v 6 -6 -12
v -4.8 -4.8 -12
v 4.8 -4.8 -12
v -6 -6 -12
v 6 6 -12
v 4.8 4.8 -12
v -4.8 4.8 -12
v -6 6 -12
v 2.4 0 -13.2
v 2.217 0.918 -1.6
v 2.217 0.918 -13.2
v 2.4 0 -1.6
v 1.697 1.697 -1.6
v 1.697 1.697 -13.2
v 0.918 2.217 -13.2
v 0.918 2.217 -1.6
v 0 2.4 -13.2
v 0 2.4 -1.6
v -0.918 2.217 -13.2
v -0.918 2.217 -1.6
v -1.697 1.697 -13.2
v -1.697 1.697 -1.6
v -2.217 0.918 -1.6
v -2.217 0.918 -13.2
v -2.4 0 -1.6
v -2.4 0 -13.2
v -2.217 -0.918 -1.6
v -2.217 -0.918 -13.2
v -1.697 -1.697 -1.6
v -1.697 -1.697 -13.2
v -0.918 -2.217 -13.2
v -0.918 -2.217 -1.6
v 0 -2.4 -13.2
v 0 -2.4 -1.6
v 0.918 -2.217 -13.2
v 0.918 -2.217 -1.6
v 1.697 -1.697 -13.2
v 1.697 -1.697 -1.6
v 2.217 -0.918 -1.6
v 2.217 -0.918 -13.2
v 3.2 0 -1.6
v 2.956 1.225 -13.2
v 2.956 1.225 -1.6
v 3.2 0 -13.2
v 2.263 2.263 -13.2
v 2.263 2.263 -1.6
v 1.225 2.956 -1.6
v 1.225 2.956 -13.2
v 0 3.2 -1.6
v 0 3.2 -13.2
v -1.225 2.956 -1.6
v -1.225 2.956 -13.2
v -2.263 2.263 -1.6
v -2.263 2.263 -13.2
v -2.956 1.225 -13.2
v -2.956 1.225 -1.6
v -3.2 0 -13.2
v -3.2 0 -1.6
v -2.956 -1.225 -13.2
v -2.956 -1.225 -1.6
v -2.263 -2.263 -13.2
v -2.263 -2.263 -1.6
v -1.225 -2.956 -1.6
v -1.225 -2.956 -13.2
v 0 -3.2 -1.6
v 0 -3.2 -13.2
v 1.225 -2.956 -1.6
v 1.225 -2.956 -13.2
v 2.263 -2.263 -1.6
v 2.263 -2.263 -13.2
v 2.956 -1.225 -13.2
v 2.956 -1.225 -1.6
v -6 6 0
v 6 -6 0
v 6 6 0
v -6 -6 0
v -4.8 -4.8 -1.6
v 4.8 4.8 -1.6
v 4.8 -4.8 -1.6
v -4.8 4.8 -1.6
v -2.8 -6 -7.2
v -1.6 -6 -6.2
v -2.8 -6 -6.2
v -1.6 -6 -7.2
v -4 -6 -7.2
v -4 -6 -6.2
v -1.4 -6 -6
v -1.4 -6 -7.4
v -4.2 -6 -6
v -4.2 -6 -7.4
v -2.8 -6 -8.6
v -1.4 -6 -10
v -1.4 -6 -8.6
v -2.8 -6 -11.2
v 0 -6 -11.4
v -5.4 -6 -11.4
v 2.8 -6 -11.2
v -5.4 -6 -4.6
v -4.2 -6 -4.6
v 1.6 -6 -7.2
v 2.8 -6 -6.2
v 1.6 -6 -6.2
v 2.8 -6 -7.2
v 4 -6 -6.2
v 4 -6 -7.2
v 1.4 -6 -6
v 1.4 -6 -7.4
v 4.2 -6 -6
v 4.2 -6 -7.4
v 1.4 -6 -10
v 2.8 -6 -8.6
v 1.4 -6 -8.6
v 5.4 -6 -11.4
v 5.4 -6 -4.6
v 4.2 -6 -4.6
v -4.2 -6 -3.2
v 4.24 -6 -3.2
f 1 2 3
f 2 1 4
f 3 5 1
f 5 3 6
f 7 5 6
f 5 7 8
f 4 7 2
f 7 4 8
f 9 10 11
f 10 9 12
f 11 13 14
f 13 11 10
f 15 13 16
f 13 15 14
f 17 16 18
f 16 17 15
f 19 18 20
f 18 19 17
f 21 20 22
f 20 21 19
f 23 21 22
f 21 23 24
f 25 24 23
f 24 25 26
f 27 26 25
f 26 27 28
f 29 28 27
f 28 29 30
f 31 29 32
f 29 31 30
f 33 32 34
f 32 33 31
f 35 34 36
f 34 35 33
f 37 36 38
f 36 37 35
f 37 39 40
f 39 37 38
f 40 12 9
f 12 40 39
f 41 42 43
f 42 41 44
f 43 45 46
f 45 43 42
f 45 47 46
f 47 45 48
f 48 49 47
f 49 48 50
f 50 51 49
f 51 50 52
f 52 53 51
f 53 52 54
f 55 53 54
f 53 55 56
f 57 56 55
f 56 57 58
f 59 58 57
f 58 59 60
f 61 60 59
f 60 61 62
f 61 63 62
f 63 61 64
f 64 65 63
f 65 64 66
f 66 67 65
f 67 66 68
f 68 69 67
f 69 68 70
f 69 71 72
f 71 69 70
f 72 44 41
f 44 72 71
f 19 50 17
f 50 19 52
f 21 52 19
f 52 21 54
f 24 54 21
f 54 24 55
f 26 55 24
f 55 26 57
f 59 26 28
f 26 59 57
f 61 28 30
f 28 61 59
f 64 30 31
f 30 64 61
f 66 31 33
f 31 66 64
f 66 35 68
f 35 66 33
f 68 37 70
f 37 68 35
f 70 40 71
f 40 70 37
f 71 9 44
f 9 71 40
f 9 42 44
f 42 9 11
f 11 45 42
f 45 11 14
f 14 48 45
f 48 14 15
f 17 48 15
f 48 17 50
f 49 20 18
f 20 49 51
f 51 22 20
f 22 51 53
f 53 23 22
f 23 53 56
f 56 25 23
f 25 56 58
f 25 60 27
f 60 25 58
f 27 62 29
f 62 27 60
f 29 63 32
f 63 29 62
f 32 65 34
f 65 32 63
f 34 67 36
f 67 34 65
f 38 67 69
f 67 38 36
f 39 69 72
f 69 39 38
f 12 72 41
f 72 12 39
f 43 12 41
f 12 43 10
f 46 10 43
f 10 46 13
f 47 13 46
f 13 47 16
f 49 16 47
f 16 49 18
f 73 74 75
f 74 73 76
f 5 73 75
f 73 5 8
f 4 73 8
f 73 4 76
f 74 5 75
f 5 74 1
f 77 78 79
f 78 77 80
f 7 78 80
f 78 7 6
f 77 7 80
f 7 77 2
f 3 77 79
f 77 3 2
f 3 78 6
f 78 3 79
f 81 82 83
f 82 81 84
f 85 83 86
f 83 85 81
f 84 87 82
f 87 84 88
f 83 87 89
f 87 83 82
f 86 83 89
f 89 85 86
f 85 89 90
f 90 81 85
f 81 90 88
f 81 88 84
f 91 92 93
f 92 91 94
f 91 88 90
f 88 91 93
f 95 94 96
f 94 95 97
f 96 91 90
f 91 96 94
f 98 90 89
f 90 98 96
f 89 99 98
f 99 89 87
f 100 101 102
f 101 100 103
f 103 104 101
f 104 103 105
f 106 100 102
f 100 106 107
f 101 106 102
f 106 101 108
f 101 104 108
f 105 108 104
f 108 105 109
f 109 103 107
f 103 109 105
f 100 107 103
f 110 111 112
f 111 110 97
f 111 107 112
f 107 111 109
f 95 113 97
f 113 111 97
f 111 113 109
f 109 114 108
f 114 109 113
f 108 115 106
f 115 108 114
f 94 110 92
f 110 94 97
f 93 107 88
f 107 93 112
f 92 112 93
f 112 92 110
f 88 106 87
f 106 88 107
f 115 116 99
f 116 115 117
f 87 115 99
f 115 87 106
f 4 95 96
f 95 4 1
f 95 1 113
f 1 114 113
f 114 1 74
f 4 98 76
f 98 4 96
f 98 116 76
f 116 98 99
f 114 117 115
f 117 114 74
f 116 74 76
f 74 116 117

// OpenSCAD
// file: ../p/4-4ring3.scad
use <../lib.scad>
$fa=1; $fs=0.2;
function ldraw_lib__4_4ring3(realsolid=false) = [
// 0 Ring  3 x 1.0
// 0 Name: 4-4ring3.dat
// 0 Author: James Jessiman
// 0 !LDRAW_ORG Primitive UPDATE 2009-01
// 0 !LICENSE Licensed under CC BY 2.0 and CC BY 4.0 : see CAreadme.txt
// 
// 0 BFC CERTIFY CCW
  [0,"BFC","CERTIFY"],
  [0,"BFC","CCW"],
// 
// 0 !HISTORY 1998-12-15 [PTadmin] Official Update 1998-10
// 0 !HISTORY 2002-04-05 [hafhead] Added BFC statement
// 0 !HISTORY 2002-04-25 [PTadmin] Official Update 2002-02
// 0 !HISTORY 2007-06-24 [PTadmin] Header formatted for Contributor Agreement
// 0 !HISTORY 2008-07-01 [PTadmin] Official Update 2008-01
// 0 !HISTORY 2008-08-26 [cwdee] Switch polygon winding and rename
// 0 !HISTORY 2009-05-02 [PTadmin] Official Update 2009-01
// 
// 
// 4 16 -1.5308 0 3.6956 -1.1481 0 2.7717 0 0 3 0 0 4
  [4,16,-1.5308,0,3.6956,-1.1481,0,2.7717,0,0,3,0,0,4],
// 4 16 -2.8284 0 2.8284 -2.1213 0 2.1213 -1.1481 0 2.7717 -1.5308 0 3.6956
  [4,16,-2.8284,0,2.8284,-2.1213,0,2.1213,-1.1481,0,2.7717,-1.5308,0,3.6956],
// 4 16 -3.6956 0 1.5308 -2.7717 0 1.1481 -2.1213 0 2.1213 -2.8284 0 2.8284
  [4,16,-3.6956,0,1.5308,-2.7717,0,1.1481,-2.1213,0,2.1213,-2.8284,0,2.8284],
// 4 16 -4 0 0 -3 0 0 -2.7717 0 1.1481 -3.6956 0 1.5308
  [4,16,-4,0,0,-3,0,0,-2.7717,0,1.1481,-3.6956,0,1.5308],
// 4 16 -3.6956 0 -1.5308 -2.7717 0 -1.1481 -3 0 0 -4 0 0
  [4,16,-3.6956,0,-1.5308,-2.7717,0,-1.1481,-3,0,0,-4,0,0],
// 4 16 -2.8284 0 -2.8284 -2.1213 0 -2.1213 -2.7717 0 -1.1481 -3.6956 0 -1.5308
  [4,16,-2.8284,0,-2.8284,-2.1213,0,-2.1213,-2.7717,0,-1.1481,-3.6956,0,-1.5308],
// 4 16 -1.5308 0 -3.6956 -1.1481 0 -2.7717 -2.1213 0 -2.1213 -2.8284 0 -2.8284
  [4,16,-1.5308,0,-3.6956,-1.1481,0,-2.7717,-2.1213,0,-2.1213,-2.8284,0,-2.8284],
// 4 16 0 0 -4 0 0 -3 -1.1481 0 -2.7717 -1.5308 0 -3.6956
  [4,16,0,0,-4,0,0,-3,-1.1481,0,-2.7717,-1.5308,0,-3.6956],
// 4 16 1.5308 0 -3.6956 1.1481 0 -2.7717 0 0 -3 0 0 -4
  [4,16,1.5308,0,-3.6956,1.1481,0,-2.7717,0,0,-3,0,0,-4],
// 4 16 2.8284 0 -2.8284 2.1213 0 -2.1213 1.1481 0 -2.7717 1.5308 0 -3.6956
  [4,16,2.8284,0,-2.8284,2.1213,0,-2.1213,1.1481,0,-2.7717,1.5308,0,-3.6956],
// 4 16 3.6956 0 -1.5308 2.7717 0 -1.1481 2.1213 0 -2.1213 2.8284 0 -2.8284
  [4,16,3.6956,0,-1.5308,2.7717,0,-1.1481,2.1213,0,-2.1213,2.8284,0,-2.8284],
// 4 16 4 0 0 3 0 0 2.7717 0 -1.1481 3.6956 0 -1.5308
  [4,16,4,0,0,3,0,0,2.7717,0,-1.1481,3.6956,0,-1.5308],
// 4 16 3.6956 0 1.5308 2.7717 0 1.1481 3 0 0 4 0 0
  [4,16,3.6956,0,1.5308,2.7717,0,1.1481,3,0,0,4,0,0],
// 4 16 2.8284 0 2.8284 2.1213 0 2.1213 2.7717 0 1.1481 3.6956 0 1.5308
  [4,16,2.8284,0,2.8284,2.1213,0,2.1213,2.7717,0,1.1481,3.6956,0,1.5308],
// 4 16 1.5308 0 3.6956 1.1481 0 2.7717 2.1213 0 2.1213 2.8284 0 2.8284
  [4,16,1.5308,0,3.6956,1.1481,0,2.7717,2.1213,0,2.1213,2.8284,0,2.8284],
// 4 16 0 0 4 0 0 3 1.1481 0 2.7717 1.5308 0 3.6956
  [4,16,0,0,4,0,0,3,1.1481,0,2.7717,1.5308,0,3.6956],
// 0
];
module ldraw_lib__4_4ring3(step=0, col=false, unit=2/5, alt=false, line=0.2, solid=!$preview)
    makepoly(ldraw_lib__4_4ring3(solid), step=step, col=col, unit=unit, alt=alt, line=line, solid=solid);
ldraw_lib__4_4ring3(line=0.2);
// file: ../p/4-4edge.scad
use <../lib.scad>
function ldraw_lib__4_4edge() = [
// 0 Circle 1.0
// 0 Name: 4-4edge.dat
// 0 Author: James Jessiman
// 0 !LDRAW_ORG Primitive UPDATE 2017-01
// 0 !LICENSE Licensed under CC BY 2.0 and CC BY 4.0 : see CAreadme.txt
// 
// 0 BFC CERTIFY CCW
  [0,"BFC","CERTIFY"],
  [0,"BFC","CCW"],
// 
// 0 !HISTORY 1998-12-15 [PTadmin] Official Update 1998-10
// 0 !HISTORY 2005-12-28 [PTadmin] Official Update 2005-01
// 0 !HISTORY 2007-06-24 [PTadmin] Header formatted for Contributor Agreement
// 0 !HISTORY 2008-07-01 [PTadmin] Official Update 2008-01
// 0 !HISTORY 2017-01-15 [Steffen] BFCed
// 0 !HISTORY 2017-12-30 [PTadmin] Official Update 2017-01
// 
// 
// 2 24 1 0 0 0.9239 0 0.3827
  [2,24,1,0,0,0.9239,0,0.3827],
// 2 24 0.9239 0 0.3827 0.7071 0 0.7071
  [2,24,0.9239,0,0.3827,0.7071,0,0.7071],
// 2 24 0.7071 0 0.7071 0.3827 0 0.9239
  [2,24,0.7071,0,0.7071,0.3827,0,0.9239],
// 2 24 0.3827 0 0.9239 0 0 1
  [2,24,0.3827,0,0.9239,0,0,1],
// 2 24 0 0 1 -0.3827 0 0.9239
  [2,24,0,0,1,-0.3827,0,0.9239],
// 2 24 -0.3827 0 0.9239 -0.7071 0 0.7071
  [2,24,-0.3827,0,0.9239,-0.7071,0,0.7071],
// 2 24 -0.7071 0 0.7071 -0.9239 0 0.3827
  [2,24,-0.7071,0,0.7071,-0.9239,0,0.3827],
// 2 24 -0.9239 0 0.3827 -1 0 -0
  [2,24,-0.9239,0,0.3827,-1,0,-0],
// 2 24 -1 0 -0 -0.9239 0 -0.3827
  [2,24,-1,0,-0,-0.9239,0,-0.3827],
// 2 24 -0.9239 0 -0.3827 -0.7071 0 -0.7071
  [2,24,-0.9239,0,-0.3827,-0.7071,0,-0.7071],
// 2 24 -0.7071 0 -0.7071 -0.3827 0 -0.9239
  [2,24,-0.7071,0,-0.7071,-0.3827,0,-0.9239],
// 2 24 -0.3827 0 -0.9239 0 0 -1
  [2,24,-0.3827,0,-0.9239,0,0,-1],
// 2 24 0 0 -1 0.3827 0 -0.9239
  [2,24,0,0,-1,0.3827,0,-0.9239],
// 2 24 0.3827 0 -0.9239 0.7071 0 -0.7071
  [2,24,0.3827,0,-0.9239,0.7071,0,-0.7071],
// 2 24 0.7071 0 -0.7071 0.9239 0 -0.3827
  [2,24,0.7071,0,-0.7071,0.9239,0,-0.3827],
// 2 24 0.9239 0 -0.3827 1 0 0
  [2,24,0.9239,0,-0.3827,1,0,0],
];
module ldraw_lib__4_4edge(step=0, col=false, unit=2/5, alt=false, line=0.2, solid=!$preview)
    makepoly(ldraw_lib__4_4edge(), step=step, col=col, unit=unit, alt=alt, line=line, solid=solid);
ldraw_lib__4_4edge(line=0.2);
// file: ../p/4-4cyli.scad
use <../lib.scad>
$fa=1; $fs=0.2;
function ldraw_lib__4_4cyli(realsolid=false) = [
// 0 Cylinder 1.0
// 0 Name: 4-4cyli.dat
// 0 Author: James Jessiman
// 0 !LDRAW_ORG Primitive UPDATE 2005-01
// 0 !LICENSE Licensed under CC BY 2.0 and CC BY 4.0 : see CAreadme.txt
// 
// 0 BFC CERTIFY CCW
  [0,"BFC","CERTIFY"],
  [0,"BFC","CCW"],
// 
// 0 !HISTORY 1998-12-15 [PTadmin] Official Update 1998-10
// 0 !HISTORY 2002-03-23 [sbliss] Added BFC statement; merged headers from files in distributions LDraw 0.27 and Complete.
// 0 !HISTORY 2002-04-25 [PTadmin] Official Update 2002-02
// 0 !HISTORY 2004-12-14 [guyvivan] BFC CCW
// 0 !HISTORY 2005-12-28 [PTadmin] Official Update 2005-01
// 0 !HISTORY 2007-06-24 [PTadmin] Header formatted for Contributor Agreement
// 0 !HISTORY 2008-07-01 [PTadmin] Official Update 2008-01
// 
// 
// 4 16 1 1 0 0.9239 1 0.3827 0.9239 0 0.3827 1 0 0
  [4,16,1,1,0,0.9239,1,0.3827,0.9239,0,0.3827,1,0,0],
// 5 24 1 0 0 1 1 0 0.9239 0 0.3827 0.9239 0 -0.3827
  [5,24,1,0,0,1,1,0,0.9239,0,0.3827,0.9239,0,-0.3827],
// 4 16 0.9239 1 0.3827 0.7071 1 0.7071 0.7071 0 0.7071 0.9239 0 0.3827
  [4,16,0.9239,1,0.3827,0.7071,1,0.7071,0.7071,0,0.7071,0.9239,0,0.3827],
// 5 24 0.9239 0 0.3827 0.9239 1 0.3827 0.7071 0 0.7071 1 0 0
  [5,24,0.9239,0,0.3827,0.9239,1,0.3827,0.7071,0,0.7071,1,0,0],
// 4 16 0.7071 1 0.7071 0.3827 1 0.9239 0.3827 0 0.9239 0.7071 0 0.7071
  [4,16,0.7071,1,0.7071,0.3827,1,0.9239,0.3827,0,0.9239,0.7071,0,0.7071],
// 5 24 0.7071 0 0.7071 0.7071 1 0.7071 0.3827 0 0.9239 0.9239 0 0.3827
  [5,24,0.7071,0,0.7071,0.7071,1,0.7071,0.3827,0,0.9239,0.9239,0,0.3827],
// 4 16 0.3827 1 0.9239 0 1 1 0 0 1 0.3827 0 0.9239
  [4,16,0.3827,1,0.9239,0,1,1,0,0,1,0.3827,0,0.9239],
// 5 24 0.3827 0 0.9239 0.3827 1 0.9239 0 0 1 0.7071 0 0.7071
  [5,24,0.3827,0,0.9239,0.3827,1,0.9239,0,0,1,0.7071,0,0.7071],
// 4 16 0 1 1 -0.3827 1 0.9239 -0.3827 0 0.9239 0 0 1
  [4,16,0,1,1,-0.3827,1,0.9239,-0.3827,0,0.9239,0,0,1],
// 5 24 0 0 1 0 1 1 -0.3827 0 0.9239 0.3827 0 0.9239
  [5,24,0,0,1,0,1,1,-0.3827,0,0.9239,0.3827,0,0.9239],
// 4 16 -0.3827 1 0.9239 -0.7071 1 0.7071 -0.7071 0 0.7071 -0.3827 0 0.9239
  [4,16,-0.3827,1,0.9239,-0.7071,1,0.7071,-0.7071,0,0.7071,-0.3827,0,0.9239],
// 5 24 -0.3827 0 0.9239 -0.3827 1 0.9239 -0.7071 0 0.7071 0 0 1
  [5,24,-0.3827,0,0.9239,-0.3827,1,0.9239,-0.7071,0,0.7071,0,0,1],
// 4 16 -0.7071 1 0.7071 -0.9239 1 0.3827 -0.9239 0 0.3827 -0.7071 0 0.7071
  [4,16,-0.7071,1,0.7071,-0.9239,1,0.3827,-0.9239,0,0.3827,-0.7071,0,0.7071],
// 5 24 -0.7071 0 0.7071 -0.7071 1 0.7071 -0.9239 0 0.3827 -0.3827 0 0.9239
  [5,24,-0.7071,0,0.7071,-0.7071,1,0.7071,-0.9239,0,0.3827,-0.3827,0,0.9239],
// 4 16 -0.9239 1 0.3827 -1 1 0 -1 0 0 -0.9239 0 0.3827
  [4,16,-0.9239,1,0.3827,-1,1,0,-1,0,0,-0.9239,0,0.3827],
// 5 24 -0.9239 0 0.3827 -0.9239 1 0.3827 -1 0 0 -0.7071 0 0.7071
  [5,24,-0.9239,0,0.3827,-0.9239,1,0.3827,-1,0,0,-0.7071,0,0.7071],
// 4 16 -1 1 0 -0.9239 1 -0.3827 -0.9239 0 -0.3827 -1 0 0
  [4,16,-1,1,0,-0.9239,1,-0.3827,-0.9239,0,-0.3827,-1,0,0],
// 5 24 -1 0 0 -1 1 0 -0.9239 0 -0.3827 -0.9239 0 0.3827
  [5,24,-1,0,0,-1,1,0,-0.9239,0,-0.3827,-0.9239,0,0.3827],
// 4 16 -0.9239 1 -0.3827 -0.7071 1 -0.7071 -0.7071 0 -0.7071 -0.9239 0 -0.3827
  [4,16,-0.9239,1,-0.3827,-0.7071,1,-0.7071,-0.7071,0,-0.7071,-0.9239,0,-0.3827],
// 5 24 -0.9239 0 -0.3827 -0.9239 1 -0.3827 -0.7071 0 -0.7071 -1 0 0
  [5,24,-0.9239,0,-0.3827,-0.9239,1,-0.3827,-0.7071,0,-0.7071,-1,0,0],
// 4 16 -0.7071 1 -0.7071 -0.3827 1 -0.9239 -0.3827 0 -0.9239 -0.7071 0 -0.7071
  [4,16,-0.7071,1,-0.7071,-0.3827,1,-0.9239,-0.3827,0,-0.9239,-0.7071,0,-0.7071],
// 5 24 -0.7071 0 -0.7071 -0.7071 1 -0.7071 -0.3827 0 -0.9239 -0.9239 0 -0.3827
  [5,24,-0.7071,0,-0.7071,-0.7071,1,-0.7071,-0.3827,0,-0.9239,-0.9239,0,-0.3827],
// 4 16 -0.3827 1 -0.9239 0 1 -1 0 0 -1 -0.3827 0 -0.9239
  [4,16,-0.3827,1,-0.9239,0,1,-1,0,0,-1,-0.3827,0,-0.9239],
// 5 24 -0.3827 0 -0.9239 -0.3827 1 -0.9239 0 0 -1 -0.7071 0 -0.7071
  [5,24,-0.3827,0,-0.9239,-0.3827,1,-0.9239,0,0,-1,-0.7071,0,-0.7071],
// 4 16 0 1 -1 0.3827 1 -0.9239 0.3827 0 -0.9239 0 0 -1
  [4,16,0,1,-1,0.3827,1,-0.9239,0.3827,0,-0.9239,0,0,-1],
// 5 24 0 0 -1 0 1 -1 0.3827 0 -0.9239 -0.3827 0 -0.9239
  [5,24,0,0,-1,0,1,-1,0.3827,0,-0.9239,-0.3827,0,-0.9239],
// 4 16 0.3827 1 -0.9239 0.7071 1 -0.7071 0.7071 0 -0.7071 0.3827 0 -0.9239
  [4,16,0.3827,1,-0.9239,0.7071,1,-0.7071,0.7071,0,-0.7071,0.3827,0,-0.9239],
// 5 24 0.3827 0 -0.9239 0.3827 1 -0.9239 0.7071 0 -0.7071 0 0 -1
  [5,24,0.3827,0,-0.9239,0.3827,1,-0.9239,0.7071,0,-0.7071,0,0,-1],
// 4 16 0.7071 1 -0.7071 0.9239 1 -0.3827 0.9239 0 -0.3827 0.7071 0 -0.7071
  [4,16,0.7071,1,-0.7071,0.9239,1,-0.3827,0.9239,0,-0.3827,0.7071,0,-0.7071],
// 5 24 0.7071 0 -0.7071 0.7071 1 -0.7071 0.9239 0 -0.3827 0.3827 0 -0.9239
  [5,24,0.7071,0,-0.7071,0.7071,1,-0.7071,0.9239,0,-0.3827,0.3827,0,-0.9239],
// 4 16 0.9239 1 -0.3827 1 1 0 1 0 0 0.9239 0 -0.3827
  [4,16,0.9239,1,-0.3827,1,1,0,1,0,0,0.9239,0,-0.3827],
// 5 24 0.9239 0 -0.3827 0.9239 1 -0.3827 1 0 0 0.7071 0 -0.7071
  [5,24,0.9239,0,-0.3827,0.9239,1,-0.3827,1,0,0,0.7071,0,-0.7071],
// 0
];
module ldraw_lib__4_4cyli(step=0, col=false, unit=2/5, alt=false, line=0.2, solid=!$preview)
    makepoly(ldraw_lib__4_4cyli(solid), step=step, col=col, unit=unit, alt=alt, line=line, solid=solid);
ldraw_lib__4_4cyli(line=0.2);
// file: ../p/stud4.scad
use <../lib.scad>
use <4-4cyli.scad>
use <4-4edge.scad>
use <4-4ring3.scad>
function ldraw_lib__stud4() = [
// 0 Stud Tube Open
// 0 Name: stud4.dat
// 0 Author: James Jessiman
// 0 !LDRAW_ORG Primitive UPDATE 2009-02
// 0 !LICENSE Licensed under CC BY 4.0 : see CAreadme.txt
// 
// 0 BFC CERTIFY CCW
  [0,"BFC","CERTIFY"],
  [0,"BFC","CCW"],
// 
// 0 !HISTORY 1999-07-05 [PTadmin] Official Update 1999-05
// 0 !HISTORY 2002-04-04 [sbliss] Modified for BFC compliance
// 0 !HISTORY 2002-04-25 [PTadmin] Official Update 2002-02
// 0 !HISTORY 2007-06-24 [PTadmin] Header formatted for Contributor Agreement
// 0 !HISTORY 2008-07-01 [PTadmin] Official Update 2008-01
// 0 !HISTORY 2009-06-21 [cwdee] Update ring references to 4-4ring
// 0 !HISTORY 2009-09-03 [PTadmin] Official Update 2009-02
// 
// 
// 1 16 0 -4 0 6 0 0 0 1 0 0 0 6 4-4edge.dat
  [1,16,0,-4,0,6,0,0,0,1,0,0,0,6, ldraw_lib__4_4edge()],
// 1 16 0 -4 0 8 0 0 0 1 0 0 0 8 4-4edge.dat
  [1,16,0,-4,0,8,0,0,0,1,0,0,0,8, ldraw_lib__4_4edge()],
// 1 16 0 0 0 6 0 0 0 1 0 0 0 6 4-4edge.dat
  [1,16,0,0,0,6,0,0,0,1,0,0,0,6, ldraw_lib__4_4edge()],
// 1 16 0 0 0 8 0 0 0 1 0 0 0 8 4-4edge.dat
  [1,16,0,0,0,8,0,0,0,1,0,0,0,8, ldraw_lib__4_4edge()],
// 0 BFC INVERTNEXT
  [0,"BFC","INVERTNEXT"],
// 1 16 0 -4 0 6 0 0 0 4 0 0 0 6 4-4cyli.dat
  [1,16,0,-4,0,6,0,0,0,4,0,0,0,6, ldraw_lib__4_4cyli()],
// 1 16 0 -4 0 8 0 0 0 4 0 0 0 8 4-4cyli.dat
  [1,16,0,-4,0,8,0,0,0,4,0,0,0,8, ldraw_lib__4_4cyli()],
// 1 16 0 -4 0 2 0 0 0 1 0 0 0 2 4-4ring3.dat
  [1,16,0,-4,0,2,0,0,0,1,0,0,0,2, ldraw_lib__4_4ring3()],
  [-1,16,0,0,0,2,0,0,0,-1,0,0,0,2, ldraw_lib__4_4ring3()],
// 0
];
module ldraw_lib__stud4(step=0, col=false, unit=2/5, alt=false, line=0.2, solid=!$preview)
    makepoly(ldraw_lib__stud4(), step=step, col=col, unit=unit, alt=alt, line=line, solid=solid);
ldraw_lib__stud4(line=0.2);
// file: ../p/box5.scad
use <../lib.scad>
function ldraw_lib__box5() = [
// 0 Box with 5 Faces and All Edges
// 0 Name: box5.dat
// 0 Author: James Jessiman
// 0 !LDRAW_ORG Primitive UPDATE 2012-01
// 0 !LICENSE Licensed under CC BY 2.0 and CC BY 4.0 : see CAreadme.txt
// 
// 0 BFC CERTIFY CCW
  [0,"BFC","CERTIFY"],
  [0,"BFC","CCW"],
// 
// 0 !HISTORY 2002-04-03 [sbliss] Modified for BFC compliance
// 0 !HISTORY 2002-04-25 [PTadmin] Official Update 2002-02
// 0 !HISTORY 2007-06-24 [PTadmin] Header formatted for Contributor Agreement
// 0 !HISTORY 2008-07-01 [PTadmin] Official Update 2008-01
// 0 !HISTORY 2012-02-16 [Philo] Changed to CCW
// 0 !HISTORY 2012-03-30 [PTadmin] Official Update 2012-01
// 
// 
// 2 24 1 1 1 -1 1 1
  [2,24,1,1,1,-1,1,1],
// 2 24 -1 1 1 -1 1 -1
  [2,24,-1,1,1,-1,1,-1],
// 2 24 -1 1 -1 1 1 -1
  [2,24,-1,1,-1,1,1,-1],
// 2 24 1 1 -1 1 1 1
  [2,24,1,1,-1,1,1,1],
// 2 24 1 0 1 -1 0 1
  [2,24,1,0,1,-1,0,1],
// 2 24 -1 0 1 -1 0 -1
  [2,24,-1,0,1,-1,0,-1],
// 2 24 -1 0 -1 1 0 -1
  [2,24,-1,0,-1,1,0,-1],
// 2 24 1 0 -1 1 0 1
  [2,24,1,0,-1,1,0,1],
// 2 24 1 0 1 1 1 1
  [2,24,1,0,1,1,1,1],
// 2 24 -1 0 1 -1 1 1
  [2,24,-1,0,1,-1,1,1],
// 2 24 1 0 -1 1 1 -1
  [2,24,1,0,-1,1,1,-1],
// 2 24 -1 0 -1 -1 1 -1
  [2,24,-1,0,-1,-1,1,-1],
// 4 16 -1 1 1 1 1 1 1 1 -1 -1 1 -1
  [4,16,-1,1,1,1,1,1,1,1,-1,-1,1,-1],
// 4 16 -1 1 1 -1 0 1 1 0 1 1 1 1
  [4,16,-1,1,1,-1,0,1,1,0,1,1,1,1],
// 4 16 -1 1 -1 -1 0 -1 -1 0 1 -1 1 1
  [4,16,-1,1,-1,-1,0,-1,-1,0,1,-1,1,1],
// 4 16 1 1 -1 1 0 -1 -1 0 -1 -1 1 -1
  [4,16,1,1,-1,1,0,-1,-1,0,-1,-1,1,-1],
// 4 16 1 1 1 1 0 1 1 0 -1 1 1 -1
  [4,16,1,1,1,1,0,1,1,0,-1,1,1,-1],
];
makepoly(ldraw_lib__box5(), line=0.2);
// file: ../p/box4t.scad
use <../lib.scad>
function ldraw_lib__box4t() = [
// 0 Box with 4 Adjacent Faces and All Edges
// 0 Name: box4t.dat
// 0 Author: Tore Eriksson [Tore_Eriksson]
// 0 !LDRAW_ORG Primitive UPDATE 2003-02
// 0 !LICENSE Licensed under CC BY 2.0 and CC BY 4.0 : see CAreadme.txt
// 
// 0 BFC CERTIFY CCW
  [0,"BFC","CERTIFY"],
  [0,"BFC","CCW"],
// 
// 0 !HISTORY 1997-09-29 [PTadmin] Official Update 1997-15
// 0 !HISTORY 2002-08-31 [izanette] Modified with WINDZ for BFC compliance
// 0 !HISTORY 2003-08-01 [PTadmin] Official Update 2003-02
// 0 !HISTORY 2007-06-24 [PTadmin] Header formatted for Contributor Agreement
// 0 !HISTORY 2008-07-01 [PTadmin] Official Update 2008-01
// 
// 
// 2 24 1 1 1 -1 1 1
  [2,24,1,1,1,-1,1,1],
// 2 24 -1 1 1 -1 1 -1
  [2,24,-1,1,1,-1,1,-1],
// 2 24 -1 1 -1 1 1 -1
  [2,24,-1,1,-1,1,1,-1],
// 2 24 1 1 -1 1 1 1
  [2,24,1,1,-1,1,1,1],
// 2 24 1 0 1 -1 0 1
  [2,24,1,0,1,-1,0,1],
// 2 24 -1 0 1 -1 0 -1
  [2,24,-1,0,1,-1,0,-1],
// 2 24 -1 0 -1 1 0 -1
  [2,24,-1,0,-1,1,0,-1],
// 2 24 1 0 -1 1 0 1
  [2,24,1,0,-1,1,0,1],
// 2 24 1 0 1 1 1 1
  [2,24,1,0,1,1,1,1],
// 2 24 -1 0 1 -1 1 1
  [2,24,-1,0,1,-1,1,1],
// 2 24 1 0 -1 1 1 -1
  [2,24,1,0,-1,1,1,-1],
// 2 24 -1 0 -1 -1 1 -1
  [2,24,-1,0,-1,-1,1,-1],
// 4 16 1 1 1 1 1 -1 -1 1 -1 -1 1 1
  [4,16,1,1,1,1,1,-1,-1,1,-1,-1,1,1],
// 4 16 1 1 1 -1 1 1 -1 0 1 1 0 1
  [4,16,1,1,1,-1,1,1,-1,0,1,1,0,1],
// 4 16 -1 1 1 -1 1 -1 -1 0 -1 -1 0 1
  [4,16,-1,1,1,-1,1,-1,-1,0,-1,-1,0,1],
// 0 4 16 -1 1 -1 -1 0 -1 1 0 -1 1 1 -1
// 4 16 1 1 -1 1 1 1 1 0 1 1 0 -1
  [4,16,1,1,-1,1,1,1,1,0,1,1,0,-1],
// 0
];
makepoly(ldraw_lib__box4t(), line=0.2);
// file: s/19729s01.scad
use <../../lib.scad>
use <../../p/box4t.scad>
use <../../p/box5.scad>
use <../../p/stud4.scad>
function ldraw_lib__s__19729s01() = [
// 0 ~Minifig Head Cuboid without Front Surface
// 0 Name: s\19729s01.dat
// 0 Author: Mark Kennedy [mkennedy]
// 0 !LDRAW_ORG Subpart UPDATE 2025-09
// 0 !LICENSE Licensed under CC BY 4.0 : see CAreadme.txt
// 
// 0 BFC CERTIFY CCW
  [0,"BFC","CERTIFY"],
  [0,"BFC","CCW"],
// 
// 0 !HISTORY 2016-03-18 {LEGO Digital Designer} Original part shape
// 0 !HISTORY 2016-03-28 [mkennedy] Primitive substitution
// 0 !HISTORY 2016-12-31 [PTadmin] Official Update 2016-01
// 0 !HISTORY 2025-09-27 [OrionP] Changed winding to CCW
// 0 !HISTORY 2025-09-29 [OrionP] Official Update 2025-09
// 
// 4 16 -15 30 -15 -12 30 -12 12 30 -12 15 30 -15
  [4,16,-15,30,-15,-12,30,-12,12,30,-12,15,30,-15],
// 4 16 15 30 -15 12 30 -12 12 30 12 15 30 15
  [4,16,15,30,-15,12,30,-12,12,30,12,15,30,15],
// 4 16 15 30 15 12 30 12 -12 30 12 -15 30 15
  [4,16,15,30,15,12,30,12,-12,30,12,-15,30,15],
// 4 16 -15 30 15 -12 30 12 -12 30 -12 -15 30 -15
  [4,16,-15,30,15,-12,30,12,-12,30,-12,-15,30,-15],
// 0
// 1 16 0 4 0 1 0 0 0 -7.25 0 0 0 1 stud4.dat
  [1,16,0,4,0,1,0,0,0,-7.25,0,0,0,1, ldraw_lib__stud4()],
// 1 16 0 30 0 15 0 0 0 -30 0 0 0 15 box4t.dat
  [1,16,0,30,0,15,0,0,0,-30,0,0,0,15, ldraw_lib__box4t()],
// 0 BFC INVERTNEXT
  [0,"BFC","INVERTNEXT"],
// 1 16 0 30 0 12 0 0 0 -26 0 0 0 12 box5.dat
  [1,16,0,30,0,12,0,0,0,-26,0,0,0,12, ldraw_lib__box5()],
];
module ldraw_lib__s__19729s01(step=0, col=false, unit=2/5, alt=false, line=0.2, solid=!$preview)
    makepoly(ldraw_lib__s__19729s01(), step=step, col=col, unit=unit, alt=alt, line=line, solid=solid);
ldraw_lib__s__19729s01(line=0.2);
// main file
use <../lib.scad>
use <s/19729s01.scad>
function ldraw_lib__19729p02() = [
// 0 Minifig Head Cuboid with Minecraft Steve Pattern
// 0 Name: 19729p02.dat
// 0 Author: Merlijn Wissink [legolijntje]
// 0 !LDRAW_ORG Part UPDATE 2025-09
// 0 !LICENSE Licensed under CC BY 2.0 and CC BY 4.0 : see CAreadme.txt
// 
// 0 BFC CERTIFY CCW
  [0,"BFC","CERTIFY"],
  [0,"BFC","CCW"],
// 
// 0 !KEYWORDS BrickLink 19729pb002, Rebrickable 19729pr0001, Set 21113
// 
// 0 !HISTORY 2016-12-31 [PTadmin] Official Update 2016-01
// 0 !HISTORY 2025-09-27 [OrionP] Changed winding to CCW
// 0 !HISTORY 2025-09-29 [OrionP] Official Update 2025-09
// 
// 1 16 0 0 0 1 0 0 0 1 0 0 0 1 s\19729s01.dat
  [1,16,0,0,0,1,0,0,0,1,0,0,0,1, ldraw_lib__s__19729s01()],
// 
// 4 85 -7 15.5 -15 -7 18 -15 -4 18 -15 -4 15.5 -15
  [4,85,-7,15.5,-15,-7,18,-15,-4,18,-15,-4,15.5,-15],
// 4 15 -10 15.5 -15 -10 18 -15 -7 18 -15 -7 15.5 -15
  [4,15,-10,15.5,-15,-10,18,-15,-7,18,-15,-7,15.5,-15],
// 4 0 -3.5 15 -15 -4 15.5 -15 -4 18 -15 -3.5 18.5 -15
  [4,0,-3.5,15,-15,-4,15.5,-15,-4,18,-15,-3.5,18.5,-15],
// 4 0 -10.5 15 -15 -7 15.5 -15 -4 15.5 -15 -3.5 15 -15
  [4,0,-10.5,15,-15,-7,15.5,-15,-4,15.5,-15,-3.5,15,-15],
// 3 0 -10 15.5 -15 -7 15.5 -15 -10.5 15 -15
  [3,0,-10,15.5,-15,-7,15.5,-15,-10.5,15,-15],
// 4 0 -10 18 -15 -10 15.5 -15 -10.5 15 -15 -10.5 18.5 -15
  [4,0,-10,18,-15,-10,15.5,-15,-10.5,15,-15,-10.5,18.5,-15],
// 4 0 -3.5 18.5 -15 -7 18 -15 -10 18 -15 -10.5 18.5 -15
  [4,0,-3.5,18.5,-15,-7,18,-15,-10,18,-15,-10.5,18.5,-15],
// 3 0 -7 18 -15 -3.5 18.5 -15 -4 18 -15
  [3,0,-7,18,-15,-3.5,18.5,-15,-4,18,-15],
// 4 16 -3.5 25 -15 -3.5 21.5 -15 -7 21.5 -15 -7 28 -15
  [4,16,-3.5,25,-15,-3.5,21.5,-15,-7,21.5,-15,-7,28,-15],
// 4 78 -3.5 21.5 -15 -3.5 18.5 -15 -10.5 18.5 -15 -7 21.5 -15
  [4,78,-3.5,21.5,-15,-3.5,18.5,-15,-10.5,18.5,-15,-7,21.5,-15],
// 4 78 7 28 -15 -7 28 -15 -13.5 28.5 -15 0 28.5 -15
  [4,78,7,28,-15,-7,28,-15,-13.5,28.5,-15,0,28.5,-15],
// 4 78 -10.5 18.5 -15 -13.5 28.5 -15 -7 28 -15 -7 21.5 -15
  [4,78,-10.5,18.5,-15,-13.5,28.5,-15,-7,28,-15,-7,21.5,-15],
// 4 78 -10.5 15 -15 -13.5 11.5 -15 -13.5 28.5 -15 -10.5 18.5 -15
  [4,78,-10.5,15,-15,-13.5,11.5,-15,-13.5,28.5,-15,-10.5,18.5,-15],
// 4 78 -3.5 15 -15 -10.5 11.5 -15 -13.5 11.5 -15 -10.5 15 -15
  [4,78,-3.5,15,-15,-10.5,11.5,-15,-13.5,11.5,-15,-10.5,15,-15],
// 4 85 7 15.5 -15 4 15.5 -15 4 18 -15 7 18 -15
  [4,85,7,15.5,-15,4,15.5,-15,4,18,-15,7,18,-15],
// 4 15 10 15.5 -15 7 15.5 -15 7 18 -15 10 18 -15
  [4,15,10,15.5,-15,7,15.5,-15,7,18,-15,10,18,-15],
// 4 0 3.5 15 -15 3.5 18.5 -15 4 18 -15 4 15.5 -15
  [4,0,3.5,15,-15,3.5,18.5,-15,4,18,-15,4,15.5,-15],
// 4 0 10.5 15 -15 3.5 15 -15 4 15.5 -15 7 15.5 -15
  [4,0,10.5,15,-15,3.5,15,-15,4,15.5,-15,7,15.5,-15],
// 3 0 7 15.5 -15 10 15.5 -15 10.5 15 -15
  [3,0,7,15.5,-15,10,15.5,-15,10.5,15,-15],
// 4 0 10 18 -15 10.5 18.5 -15 10.5 15 -15 10 15.5 -15
  [4,0,10,18,-15,10.5,18.5,-15,10.5,15,-15,10,15.5,-15],
// 4 0 3.5 18.5 -15 10.5 18.5 -15 10 18 -15 7 18 -15
  [4,0,3.5,18.5,-15,10.5,18.5,-15,10,18,-15,7,18,-15],
// 3 0 4 18 -15 3.5 18.5 -15 7 18 -15
  [3,0,4,18,-15,3.5,18.5,-15,7,18,-15],
// 4 16 3.5 25 -15 7 28 -15 7 21.5 -15 3.5 21.5 -15
  [4,16,3.5,25,-15,7,28,-15,7,21.5,-15,3.5,21.5,-15],
// 4 78 3.5 21.5 -15 7 21.5 -15 10.5 18.5 -15 3.5 18.5 -15
  [4,78,3.5,21.5,-15,7,21.5,-15,10.5,18.5,-15,3.5,18.5,-15],
// 3 78 0 28.5 -15 13.5 28.5 -15 7 28 -15
  [3,78,0,28.5,-15,13.5,28.5,-15,7,28,-15],
// 4 78 10.5 18.5 -15 7 21.5 -15 7 28 -15 13.5 28.5 -15
  [4,78,10.5,18.5,-15,7,21.5,-15,7,28,-15,13.5,28.5,-15],
// 4 78 10.5 15 -15 10.5 18.5 -15 13.5 28.5 -15 13.5 11.5 -15
  [4,78,10.5,15,-15,10.5,18.5,-15,13.5,28.5,-15,13.5,11.5,-15],
// 4 78 3.5 15 -15 10.5 15 -15 13.5 11.5 -15 10.5 11.5 -15
  [4,78,3.5,15,-15,10.5,15,-15,13.5,11.5,-15,10.5,11.5,-15],
// 4 16 3.5 25 -15 -3.5 25 -15 -7 28 -15 7 28 -15
  [4,16,3.5,25,-15,-3.5,25,-15,-7,28,-15,7,28,-15],
// 4 25 3.5 18.5 -15 -3.5 18.5 -15 -3.5 21.5 -15 3.5 21.5 -15
  [4,25,3.5,18.5,-15,-3.5,18.5,-15,-3.5,21.5,-15,3.5,21.5,-15],
// 4 78 -3.5 25 -15 3.5 25 -15 3.5 21.5 -15 -3.5 21.5 -15
  [4,78,-3.5,25,-15,3.5,25,-15,3.5,21.5,-15,-3.5,21.5,-15],
// 4 78 3.5 15 -15 -3.5 15 -15 -3.5 18.5 -15 3.5 18.5 -15
  [4,78,3.5,15,-15,-3.5,15,-15,-3.5,18.5,-15,3.5,18.5,-15],
// 4 78 10.5 11.5 -15 10.6 8 -15 -10.5 8 -15 -10.5 11.5 -15
  [4,78,10.5,11.5,-15,10.6,8,-15,-10.5,8,-15,-10.5,11.5,-15],
// 4 78 3.5 15 -15 10.5 11.5 -15 -10.5 11.5 -15 -3.5 15 -15
  [4,78,3.5,15,-15,10.5,11.5,-15,-10.5,11.5,-15,-3.5,15,-15],
// 4 16 15 30 -15 0 28.5 -15 -13.5 28.5 -15 -15 30 -15
  [4,16,15,30,-15,0,28.5,-15,-13.5,28.5,-15,-15,30,-15],
// 3 16 0 28.5 -15 15 30 -15 13.5 28.5 -15
  [3,16,0,28.5,-15,15,30,-15,13.5,28.5,-15],
// 4 16 15 0 -15 13.5 11.5 -15 13.5 28.5 -15 15 30 -15
  [4,16,15,0,-15,13.5,11.5,-15,13.5,28.5,-15,15,30,-15],
// 4 16 -15 0 -15 -15 30 -15 -13.5 28.5 -15 -13.5 11.5 -15
  [4,16,-15,0,-15,-15,30,-15,-13.5,28.5,-15,-13.5,11.5,-15],
// 4 16 -10.5 11.5 -15 -10.5 8 -15 -15 0 -15 -13.5 11.5 -15
  [4,16,-10.5,11.5,-15,-10.5,8,-15,-15,0,-15,-13.5,11.5,-15],
// 4 16 15 0 -15 10.6 8 -15 10.5 11.5 -15 13.5 11.5 -15
  [4,16,15,0,-15,10.6,8,-15,10.5,11.5,-15,13.5,11.5,-15],
// 4 16 -10.5 8 -15 10.6 8 -15 15 0 -15 -15 0 -15
  [4,16,-10.5,8,-15,10.6,8,-15,15,0,-15,-15,0,-15],
];
module ldraw_lib__19729p02(step=0, col=false, unit=2/5, alt=false, line=0.2, solid=!$preview)
    makepoly(ldraw_lib__19729p02(), step=step, col=col, unit=unit, alt=alt, line=line, solid=solid);
ldraw_lib__19729p02(line=0.2);
